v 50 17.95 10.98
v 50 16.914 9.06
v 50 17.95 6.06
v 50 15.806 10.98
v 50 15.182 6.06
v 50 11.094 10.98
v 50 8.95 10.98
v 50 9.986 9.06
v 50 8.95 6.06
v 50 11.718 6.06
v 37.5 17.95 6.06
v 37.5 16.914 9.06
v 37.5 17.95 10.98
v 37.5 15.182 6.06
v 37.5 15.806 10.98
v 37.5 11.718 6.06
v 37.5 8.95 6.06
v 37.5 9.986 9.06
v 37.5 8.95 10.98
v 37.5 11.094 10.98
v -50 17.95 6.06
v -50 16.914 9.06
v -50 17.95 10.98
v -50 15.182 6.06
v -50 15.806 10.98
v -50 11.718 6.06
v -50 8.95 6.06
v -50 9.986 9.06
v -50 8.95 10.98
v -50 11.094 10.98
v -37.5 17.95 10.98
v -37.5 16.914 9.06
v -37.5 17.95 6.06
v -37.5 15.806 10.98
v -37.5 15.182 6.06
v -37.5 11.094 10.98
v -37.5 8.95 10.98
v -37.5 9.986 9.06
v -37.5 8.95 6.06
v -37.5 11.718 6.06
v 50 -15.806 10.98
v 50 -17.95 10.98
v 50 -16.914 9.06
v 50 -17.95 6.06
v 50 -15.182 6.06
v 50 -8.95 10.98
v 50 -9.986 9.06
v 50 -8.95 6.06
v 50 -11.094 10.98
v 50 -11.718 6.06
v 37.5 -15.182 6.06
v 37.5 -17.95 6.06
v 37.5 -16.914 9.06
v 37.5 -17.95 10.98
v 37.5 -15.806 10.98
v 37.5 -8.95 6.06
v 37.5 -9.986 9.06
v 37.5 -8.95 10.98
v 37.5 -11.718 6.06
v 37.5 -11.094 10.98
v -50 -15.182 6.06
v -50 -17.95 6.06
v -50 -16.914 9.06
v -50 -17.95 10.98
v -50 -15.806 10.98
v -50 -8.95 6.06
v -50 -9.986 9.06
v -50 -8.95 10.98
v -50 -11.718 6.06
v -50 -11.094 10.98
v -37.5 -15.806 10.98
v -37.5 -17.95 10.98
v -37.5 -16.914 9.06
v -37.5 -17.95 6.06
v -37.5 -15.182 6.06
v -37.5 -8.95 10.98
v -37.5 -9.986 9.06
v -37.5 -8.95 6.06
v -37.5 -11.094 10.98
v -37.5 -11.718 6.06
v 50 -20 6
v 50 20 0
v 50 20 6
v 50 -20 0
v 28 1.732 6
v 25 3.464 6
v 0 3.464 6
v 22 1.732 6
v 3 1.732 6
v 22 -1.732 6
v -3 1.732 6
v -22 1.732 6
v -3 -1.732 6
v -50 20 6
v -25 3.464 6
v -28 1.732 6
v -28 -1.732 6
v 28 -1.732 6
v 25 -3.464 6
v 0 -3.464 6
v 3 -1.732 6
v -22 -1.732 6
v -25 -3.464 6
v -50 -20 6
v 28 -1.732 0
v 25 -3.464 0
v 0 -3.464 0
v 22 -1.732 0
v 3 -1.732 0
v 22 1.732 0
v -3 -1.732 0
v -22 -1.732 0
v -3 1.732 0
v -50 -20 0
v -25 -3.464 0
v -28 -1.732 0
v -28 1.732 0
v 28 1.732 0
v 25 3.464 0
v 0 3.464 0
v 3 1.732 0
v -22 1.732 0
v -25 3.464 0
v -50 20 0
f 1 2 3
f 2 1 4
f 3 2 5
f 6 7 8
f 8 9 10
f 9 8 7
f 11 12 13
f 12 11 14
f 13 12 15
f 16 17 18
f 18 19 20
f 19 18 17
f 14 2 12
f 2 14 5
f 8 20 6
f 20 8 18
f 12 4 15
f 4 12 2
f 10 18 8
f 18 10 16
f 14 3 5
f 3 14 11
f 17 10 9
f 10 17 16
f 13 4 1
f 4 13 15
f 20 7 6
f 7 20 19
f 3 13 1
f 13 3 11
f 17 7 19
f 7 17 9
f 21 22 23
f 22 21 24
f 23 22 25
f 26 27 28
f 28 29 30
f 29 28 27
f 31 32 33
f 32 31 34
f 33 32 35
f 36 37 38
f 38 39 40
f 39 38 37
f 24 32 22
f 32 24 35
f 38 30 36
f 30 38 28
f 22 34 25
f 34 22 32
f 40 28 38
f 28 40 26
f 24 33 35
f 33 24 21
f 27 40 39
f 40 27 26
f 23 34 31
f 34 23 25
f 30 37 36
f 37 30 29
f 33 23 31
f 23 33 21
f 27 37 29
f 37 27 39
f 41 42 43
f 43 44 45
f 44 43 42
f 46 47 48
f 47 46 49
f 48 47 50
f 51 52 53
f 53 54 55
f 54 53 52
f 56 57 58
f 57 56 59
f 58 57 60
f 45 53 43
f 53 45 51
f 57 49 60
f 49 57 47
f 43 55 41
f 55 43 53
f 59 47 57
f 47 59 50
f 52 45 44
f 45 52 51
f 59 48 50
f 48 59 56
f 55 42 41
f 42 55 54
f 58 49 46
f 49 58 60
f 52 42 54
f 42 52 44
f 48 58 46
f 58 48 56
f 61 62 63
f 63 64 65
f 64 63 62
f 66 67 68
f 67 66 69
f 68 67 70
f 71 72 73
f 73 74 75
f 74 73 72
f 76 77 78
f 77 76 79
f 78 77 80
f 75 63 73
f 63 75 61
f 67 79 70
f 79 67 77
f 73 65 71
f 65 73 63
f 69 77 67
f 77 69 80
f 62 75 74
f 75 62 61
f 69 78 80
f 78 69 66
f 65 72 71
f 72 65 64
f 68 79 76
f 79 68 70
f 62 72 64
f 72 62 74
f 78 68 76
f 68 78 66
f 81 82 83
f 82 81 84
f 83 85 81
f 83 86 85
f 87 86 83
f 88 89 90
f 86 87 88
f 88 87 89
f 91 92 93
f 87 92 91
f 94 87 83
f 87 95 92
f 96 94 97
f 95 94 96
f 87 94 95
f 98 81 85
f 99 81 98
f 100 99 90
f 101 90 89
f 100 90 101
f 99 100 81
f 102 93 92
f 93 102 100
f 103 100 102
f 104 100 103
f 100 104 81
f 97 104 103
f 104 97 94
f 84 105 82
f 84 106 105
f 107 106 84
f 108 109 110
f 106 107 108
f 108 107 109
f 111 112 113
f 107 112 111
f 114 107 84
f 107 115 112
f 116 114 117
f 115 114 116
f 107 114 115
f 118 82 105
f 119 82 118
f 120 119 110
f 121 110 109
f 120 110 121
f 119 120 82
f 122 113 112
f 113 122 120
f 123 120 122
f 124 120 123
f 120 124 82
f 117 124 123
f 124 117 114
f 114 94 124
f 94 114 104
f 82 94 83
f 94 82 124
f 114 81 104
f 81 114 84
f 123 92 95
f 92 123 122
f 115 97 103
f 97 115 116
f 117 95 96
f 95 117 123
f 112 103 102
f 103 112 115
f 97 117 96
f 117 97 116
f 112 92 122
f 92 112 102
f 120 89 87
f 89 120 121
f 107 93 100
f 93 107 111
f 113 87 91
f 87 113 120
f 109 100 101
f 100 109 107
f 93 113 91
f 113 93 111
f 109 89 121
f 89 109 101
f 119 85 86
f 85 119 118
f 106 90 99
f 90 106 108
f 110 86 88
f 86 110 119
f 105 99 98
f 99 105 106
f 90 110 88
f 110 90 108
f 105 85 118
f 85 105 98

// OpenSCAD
/*
 This creates a general purpose widget holder to stradle two rails on a cage system. 
 The calculations are done such that the given Z height is entirely above the rails with additional material below and beside the rails.
 */

// length or x direction (length along the rail)
length_x = 100;
// Width or y direction (width across rails)
Width_y = 40;
// Height or z direction (height above rail)
Height_z = 6;

Rail_Diameter = 6;

Rail_Spacing = 26.9;

Number_of_Holes = 3; //[0:10]
 
Hole_Diameter = 6; 
//nutSize = 8; //size of nuts


difference(){
    Put_Together();
    make_holes(Hole_Diameter);
}

module Put_Together(){
    union(){
        make_rodholder();
        mirror ([1,0,0])make_rodholder();
        mirror ([0,1,0])make_rodholder();
        mirror ([1,0,0])mirror ([0,1,0])make_rodholder();
        main_body();
    }
}


module make_rodholder(){
    translate([7*length_x/16,Rail_Spacing/2,Rail_Diameter*.51 + Height_z])//translate to get rail holder to 0z
    difference(){
    translate([0,0,Rail_Diameter*-.09])cube([length_x/8,Rail_Diameter*1.5,Rail_Diameter*.82],true);//0.82 rail diameter gives limited contact with incircle; -0.09 translate sets floor
    rotate ([0,90,0]) make_hex(-30, 30, 90, Rail_Diameter, length_x/8 );
    }


}
module make_holes(Hole_Diameter){
    if (Number_of_Holes > 0)
        {
            for (a=[1:Number_of_Holes])
            translate ([(a * length_x/ (Number_of_Holes +1)) - (length_x/2),0,0]) make_hex(-30, 30, 90, Hole_Diameter, 2*Height_z);                   
    }
}
module make_hex(Rx,Ry,Rz,Diam,Len){
    s =Diam/2 * ( 2 * tan(30));
        for (r = [Rx,Ry,Rz]) rotate([0,0,r]) cube([s, Diam, Len], true);
            }
module main_body(){
    translate ([0,0,(Height_z ) /2]) cube(size = [length_x, Width_y, (Height_z )], center = true);
}
module fancy_body(){
hull(){
    translate ([0,0,Height_z/4]) cube (size = [length_x,Width_y,Height_z/2], center = true);
    translate ([0,0,Height_z/2]) scale ([length_x,2,1])rotate ([0,90,0]) cylinder (h = 1, r=Height_z/2, center = true, $fn=100);
}
}
